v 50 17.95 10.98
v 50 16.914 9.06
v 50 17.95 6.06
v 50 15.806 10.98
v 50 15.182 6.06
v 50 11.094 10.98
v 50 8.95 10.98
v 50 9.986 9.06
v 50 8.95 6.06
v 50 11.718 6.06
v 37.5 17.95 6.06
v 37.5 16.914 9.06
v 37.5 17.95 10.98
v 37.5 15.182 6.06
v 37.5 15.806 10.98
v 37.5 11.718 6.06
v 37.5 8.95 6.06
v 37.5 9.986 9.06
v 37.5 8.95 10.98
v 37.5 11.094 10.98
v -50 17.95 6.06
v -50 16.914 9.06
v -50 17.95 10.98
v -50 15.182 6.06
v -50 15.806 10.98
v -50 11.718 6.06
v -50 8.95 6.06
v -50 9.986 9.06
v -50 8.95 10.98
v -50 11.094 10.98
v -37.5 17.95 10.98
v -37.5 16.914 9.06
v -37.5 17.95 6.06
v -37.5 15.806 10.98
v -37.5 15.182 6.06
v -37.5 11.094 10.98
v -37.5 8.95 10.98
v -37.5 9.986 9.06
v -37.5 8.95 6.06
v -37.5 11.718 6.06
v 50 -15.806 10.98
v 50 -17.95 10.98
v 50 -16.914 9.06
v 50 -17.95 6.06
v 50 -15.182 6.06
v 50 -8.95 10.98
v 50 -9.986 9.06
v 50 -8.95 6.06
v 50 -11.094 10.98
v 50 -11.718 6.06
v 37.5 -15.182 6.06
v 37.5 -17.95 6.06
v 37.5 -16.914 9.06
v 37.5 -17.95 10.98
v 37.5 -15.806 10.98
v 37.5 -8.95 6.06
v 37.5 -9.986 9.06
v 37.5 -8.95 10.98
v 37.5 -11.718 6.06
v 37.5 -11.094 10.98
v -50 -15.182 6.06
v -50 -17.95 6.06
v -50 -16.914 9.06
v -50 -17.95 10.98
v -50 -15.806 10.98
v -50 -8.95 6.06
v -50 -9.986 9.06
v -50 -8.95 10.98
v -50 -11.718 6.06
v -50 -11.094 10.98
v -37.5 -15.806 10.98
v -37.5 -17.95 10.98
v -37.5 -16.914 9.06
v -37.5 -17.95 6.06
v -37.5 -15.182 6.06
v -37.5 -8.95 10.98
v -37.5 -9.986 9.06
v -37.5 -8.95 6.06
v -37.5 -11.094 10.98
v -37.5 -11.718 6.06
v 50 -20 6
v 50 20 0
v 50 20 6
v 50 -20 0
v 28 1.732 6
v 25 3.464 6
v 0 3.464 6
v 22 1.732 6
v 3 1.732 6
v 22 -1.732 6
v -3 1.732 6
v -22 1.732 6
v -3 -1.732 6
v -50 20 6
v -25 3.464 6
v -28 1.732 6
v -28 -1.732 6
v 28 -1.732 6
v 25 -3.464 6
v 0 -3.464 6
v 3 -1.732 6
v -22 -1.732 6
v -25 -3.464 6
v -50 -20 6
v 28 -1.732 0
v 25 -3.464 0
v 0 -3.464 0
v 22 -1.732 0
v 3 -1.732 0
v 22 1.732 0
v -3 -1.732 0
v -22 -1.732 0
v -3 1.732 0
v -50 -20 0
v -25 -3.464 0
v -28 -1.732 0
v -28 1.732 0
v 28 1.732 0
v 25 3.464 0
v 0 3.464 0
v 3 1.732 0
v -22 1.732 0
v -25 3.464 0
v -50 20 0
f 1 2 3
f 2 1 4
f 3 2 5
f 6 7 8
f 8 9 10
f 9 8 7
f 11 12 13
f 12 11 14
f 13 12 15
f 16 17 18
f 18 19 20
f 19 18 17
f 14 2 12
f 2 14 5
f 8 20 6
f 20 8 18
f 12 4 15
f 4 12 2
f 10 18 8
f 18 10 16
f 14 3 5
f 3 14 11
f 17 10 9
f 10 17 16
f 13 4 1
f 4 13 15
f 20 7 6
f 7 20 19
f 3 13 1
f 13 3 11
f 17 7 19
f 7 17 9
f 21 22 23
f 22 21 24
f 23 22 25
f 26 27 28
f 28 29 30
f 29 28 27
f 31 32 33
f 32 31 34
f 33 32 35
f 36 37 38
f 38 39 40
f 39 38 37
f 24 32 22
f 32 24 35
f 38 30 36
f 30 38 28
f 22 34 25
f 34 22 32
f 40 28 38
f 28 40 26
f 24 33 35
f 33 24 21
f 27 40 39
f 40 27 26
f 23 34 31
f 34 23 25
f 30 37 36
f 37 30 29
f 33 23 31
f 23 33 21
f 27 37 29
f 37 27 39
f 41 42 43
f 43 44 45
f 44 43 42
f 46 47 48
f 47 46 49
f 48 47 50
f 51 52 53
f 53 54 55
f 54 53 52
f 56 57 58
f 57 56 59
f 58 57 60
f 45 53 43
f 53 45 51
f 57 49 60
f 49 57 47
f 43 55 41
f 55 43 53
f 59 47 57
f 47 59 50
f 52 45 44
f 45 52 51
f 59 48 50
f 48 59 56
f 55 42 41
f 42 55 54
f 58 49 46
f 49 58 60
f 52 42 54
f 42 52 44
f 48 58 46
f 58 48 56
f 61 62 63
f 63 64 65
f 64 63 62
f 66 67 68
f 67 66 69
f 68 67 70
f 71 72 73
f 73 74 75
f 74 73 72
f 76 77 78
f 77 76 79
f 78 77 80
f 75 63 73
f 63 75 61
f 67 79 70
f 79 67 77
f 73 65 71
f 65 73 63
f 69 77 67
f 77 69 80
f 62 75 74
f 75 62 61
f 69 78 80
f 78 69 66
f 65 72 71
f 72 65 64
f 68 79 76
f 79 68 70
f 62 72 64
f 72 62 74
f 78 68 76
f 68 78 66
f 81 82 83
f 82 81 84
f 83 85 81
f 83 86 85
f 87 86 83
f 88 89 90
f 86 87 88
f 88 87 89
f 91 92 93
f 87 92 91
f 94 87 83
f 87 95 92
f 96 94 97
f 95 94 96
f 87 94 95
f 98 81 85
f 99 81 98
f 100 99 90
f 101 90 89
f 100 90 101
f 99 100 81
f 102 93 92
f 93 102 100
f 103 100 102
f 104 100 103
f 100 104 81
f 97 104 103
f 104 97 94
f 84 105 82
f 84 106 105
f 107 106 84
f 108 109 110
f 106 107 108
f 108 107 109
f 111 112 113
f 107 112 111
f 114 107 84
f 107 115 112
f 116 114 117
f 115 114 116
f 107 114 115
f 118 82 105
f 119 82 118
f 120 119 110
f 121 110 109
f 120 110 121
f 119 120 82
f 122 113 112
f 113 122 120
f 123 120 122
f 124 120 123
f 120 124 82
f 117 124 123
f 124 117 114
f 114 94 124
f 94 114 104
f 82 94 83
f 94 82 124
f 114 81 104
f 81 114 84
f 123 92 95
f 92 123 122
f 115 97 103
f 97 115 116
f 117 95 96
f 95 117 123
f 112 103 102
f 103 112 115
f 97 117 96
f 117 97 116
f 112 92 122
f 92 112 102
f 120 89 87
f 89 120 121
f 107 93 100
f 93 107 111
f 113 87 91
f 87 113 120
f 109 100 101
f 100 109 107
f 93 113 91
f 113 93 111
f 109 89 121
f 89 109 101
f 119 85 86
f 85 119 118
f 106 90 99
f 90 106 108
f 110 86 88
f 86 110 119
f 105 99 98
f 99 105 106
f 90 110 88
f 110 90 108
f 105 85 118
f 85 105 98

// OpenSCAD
/*
 This creates a general purpose widget holder to stradle two rails on a cage system. 
 The calculations are done such that the given Z height is entirely above the rails with additional material below and beside the rails.
 */

// length or x direction (length along the rail)
length_x = 100;
// Width or y direction (width across rails)
Width_y = 40;
// Height or z direction (height above rail)
Height_z = 6;

Rail_Diameter = 6;

Rail_Spacing = 26.9;

Number_of_Holes = 3; //[0:10]
 
Hole_Diameter = 6; 
//nutSize = 8; //size of nuts


difference(){
    Put_Together();
    make_holes(Hole_Diameter);
}

module Put_Together(){
    union(){
        make_rodholder();
        mirror ([1,0,0])make_rodholder();
        mirror ([0,1,0])make_rodholder();
        mirror ([1,0,0])mirror ([0,1,0])make_rodholder();
        main_body();
    }
}


module make_rodholder(){
    translate([7*length_x/16,Rail_Spacing/2,Rail_Diameter*.51 + Height_z])//translate to get rail holder to 0z
    difference(){
    translate([0,0,Rail_Diameter*-.09])cube([length_x/8,Rail_Diameter*1.5,Rail_Diameter*.82],true);//0.82 rail diameter gives limited contact with incircle; -0.09 translate sets floor
    rotate ([0,90,0]) make_hex(-30, 30, 90, Rail_Diameter, length_x/8 );
    }


}
module make_holes(Hole_Diameter){
    if (Number_of_Holes > 0)
        {
            for (a=[1:Number_of_Holes])
            translate ([(a * length_x/ (Number_of_Holes +1)) - (length_x/2),0,0]) make_hex(-30, 30, 90, Hole_Diameter, 2*Height_z);                   
    }
}
module make_hex(Rx,Ry,Rz,Diam,Len){
    s =Diam/2 * ( 2 * tan(30));
        for (r = [Rx,Ry,Rz]) rotate([0,0,r]) cube([s, Diam, Len], true);
            }
module main_body(){
    translate ([0,0,(Height_z ) /2]) cube(size = [length_x, Width_y, (Height_z )], center = true);
}
module fancy_body(){
hull(){
    translate ([0,0,Height_z/4]) cube (size = [length_x,Width_y,Height_z/2], center = true);
    translate ([0,0,Height_z/2]) scale ([length_x,2,1])rotate ([0,90,0]) cylinder (h = 1, r=Height_z/2, center = true, $fn=100);
}
}
